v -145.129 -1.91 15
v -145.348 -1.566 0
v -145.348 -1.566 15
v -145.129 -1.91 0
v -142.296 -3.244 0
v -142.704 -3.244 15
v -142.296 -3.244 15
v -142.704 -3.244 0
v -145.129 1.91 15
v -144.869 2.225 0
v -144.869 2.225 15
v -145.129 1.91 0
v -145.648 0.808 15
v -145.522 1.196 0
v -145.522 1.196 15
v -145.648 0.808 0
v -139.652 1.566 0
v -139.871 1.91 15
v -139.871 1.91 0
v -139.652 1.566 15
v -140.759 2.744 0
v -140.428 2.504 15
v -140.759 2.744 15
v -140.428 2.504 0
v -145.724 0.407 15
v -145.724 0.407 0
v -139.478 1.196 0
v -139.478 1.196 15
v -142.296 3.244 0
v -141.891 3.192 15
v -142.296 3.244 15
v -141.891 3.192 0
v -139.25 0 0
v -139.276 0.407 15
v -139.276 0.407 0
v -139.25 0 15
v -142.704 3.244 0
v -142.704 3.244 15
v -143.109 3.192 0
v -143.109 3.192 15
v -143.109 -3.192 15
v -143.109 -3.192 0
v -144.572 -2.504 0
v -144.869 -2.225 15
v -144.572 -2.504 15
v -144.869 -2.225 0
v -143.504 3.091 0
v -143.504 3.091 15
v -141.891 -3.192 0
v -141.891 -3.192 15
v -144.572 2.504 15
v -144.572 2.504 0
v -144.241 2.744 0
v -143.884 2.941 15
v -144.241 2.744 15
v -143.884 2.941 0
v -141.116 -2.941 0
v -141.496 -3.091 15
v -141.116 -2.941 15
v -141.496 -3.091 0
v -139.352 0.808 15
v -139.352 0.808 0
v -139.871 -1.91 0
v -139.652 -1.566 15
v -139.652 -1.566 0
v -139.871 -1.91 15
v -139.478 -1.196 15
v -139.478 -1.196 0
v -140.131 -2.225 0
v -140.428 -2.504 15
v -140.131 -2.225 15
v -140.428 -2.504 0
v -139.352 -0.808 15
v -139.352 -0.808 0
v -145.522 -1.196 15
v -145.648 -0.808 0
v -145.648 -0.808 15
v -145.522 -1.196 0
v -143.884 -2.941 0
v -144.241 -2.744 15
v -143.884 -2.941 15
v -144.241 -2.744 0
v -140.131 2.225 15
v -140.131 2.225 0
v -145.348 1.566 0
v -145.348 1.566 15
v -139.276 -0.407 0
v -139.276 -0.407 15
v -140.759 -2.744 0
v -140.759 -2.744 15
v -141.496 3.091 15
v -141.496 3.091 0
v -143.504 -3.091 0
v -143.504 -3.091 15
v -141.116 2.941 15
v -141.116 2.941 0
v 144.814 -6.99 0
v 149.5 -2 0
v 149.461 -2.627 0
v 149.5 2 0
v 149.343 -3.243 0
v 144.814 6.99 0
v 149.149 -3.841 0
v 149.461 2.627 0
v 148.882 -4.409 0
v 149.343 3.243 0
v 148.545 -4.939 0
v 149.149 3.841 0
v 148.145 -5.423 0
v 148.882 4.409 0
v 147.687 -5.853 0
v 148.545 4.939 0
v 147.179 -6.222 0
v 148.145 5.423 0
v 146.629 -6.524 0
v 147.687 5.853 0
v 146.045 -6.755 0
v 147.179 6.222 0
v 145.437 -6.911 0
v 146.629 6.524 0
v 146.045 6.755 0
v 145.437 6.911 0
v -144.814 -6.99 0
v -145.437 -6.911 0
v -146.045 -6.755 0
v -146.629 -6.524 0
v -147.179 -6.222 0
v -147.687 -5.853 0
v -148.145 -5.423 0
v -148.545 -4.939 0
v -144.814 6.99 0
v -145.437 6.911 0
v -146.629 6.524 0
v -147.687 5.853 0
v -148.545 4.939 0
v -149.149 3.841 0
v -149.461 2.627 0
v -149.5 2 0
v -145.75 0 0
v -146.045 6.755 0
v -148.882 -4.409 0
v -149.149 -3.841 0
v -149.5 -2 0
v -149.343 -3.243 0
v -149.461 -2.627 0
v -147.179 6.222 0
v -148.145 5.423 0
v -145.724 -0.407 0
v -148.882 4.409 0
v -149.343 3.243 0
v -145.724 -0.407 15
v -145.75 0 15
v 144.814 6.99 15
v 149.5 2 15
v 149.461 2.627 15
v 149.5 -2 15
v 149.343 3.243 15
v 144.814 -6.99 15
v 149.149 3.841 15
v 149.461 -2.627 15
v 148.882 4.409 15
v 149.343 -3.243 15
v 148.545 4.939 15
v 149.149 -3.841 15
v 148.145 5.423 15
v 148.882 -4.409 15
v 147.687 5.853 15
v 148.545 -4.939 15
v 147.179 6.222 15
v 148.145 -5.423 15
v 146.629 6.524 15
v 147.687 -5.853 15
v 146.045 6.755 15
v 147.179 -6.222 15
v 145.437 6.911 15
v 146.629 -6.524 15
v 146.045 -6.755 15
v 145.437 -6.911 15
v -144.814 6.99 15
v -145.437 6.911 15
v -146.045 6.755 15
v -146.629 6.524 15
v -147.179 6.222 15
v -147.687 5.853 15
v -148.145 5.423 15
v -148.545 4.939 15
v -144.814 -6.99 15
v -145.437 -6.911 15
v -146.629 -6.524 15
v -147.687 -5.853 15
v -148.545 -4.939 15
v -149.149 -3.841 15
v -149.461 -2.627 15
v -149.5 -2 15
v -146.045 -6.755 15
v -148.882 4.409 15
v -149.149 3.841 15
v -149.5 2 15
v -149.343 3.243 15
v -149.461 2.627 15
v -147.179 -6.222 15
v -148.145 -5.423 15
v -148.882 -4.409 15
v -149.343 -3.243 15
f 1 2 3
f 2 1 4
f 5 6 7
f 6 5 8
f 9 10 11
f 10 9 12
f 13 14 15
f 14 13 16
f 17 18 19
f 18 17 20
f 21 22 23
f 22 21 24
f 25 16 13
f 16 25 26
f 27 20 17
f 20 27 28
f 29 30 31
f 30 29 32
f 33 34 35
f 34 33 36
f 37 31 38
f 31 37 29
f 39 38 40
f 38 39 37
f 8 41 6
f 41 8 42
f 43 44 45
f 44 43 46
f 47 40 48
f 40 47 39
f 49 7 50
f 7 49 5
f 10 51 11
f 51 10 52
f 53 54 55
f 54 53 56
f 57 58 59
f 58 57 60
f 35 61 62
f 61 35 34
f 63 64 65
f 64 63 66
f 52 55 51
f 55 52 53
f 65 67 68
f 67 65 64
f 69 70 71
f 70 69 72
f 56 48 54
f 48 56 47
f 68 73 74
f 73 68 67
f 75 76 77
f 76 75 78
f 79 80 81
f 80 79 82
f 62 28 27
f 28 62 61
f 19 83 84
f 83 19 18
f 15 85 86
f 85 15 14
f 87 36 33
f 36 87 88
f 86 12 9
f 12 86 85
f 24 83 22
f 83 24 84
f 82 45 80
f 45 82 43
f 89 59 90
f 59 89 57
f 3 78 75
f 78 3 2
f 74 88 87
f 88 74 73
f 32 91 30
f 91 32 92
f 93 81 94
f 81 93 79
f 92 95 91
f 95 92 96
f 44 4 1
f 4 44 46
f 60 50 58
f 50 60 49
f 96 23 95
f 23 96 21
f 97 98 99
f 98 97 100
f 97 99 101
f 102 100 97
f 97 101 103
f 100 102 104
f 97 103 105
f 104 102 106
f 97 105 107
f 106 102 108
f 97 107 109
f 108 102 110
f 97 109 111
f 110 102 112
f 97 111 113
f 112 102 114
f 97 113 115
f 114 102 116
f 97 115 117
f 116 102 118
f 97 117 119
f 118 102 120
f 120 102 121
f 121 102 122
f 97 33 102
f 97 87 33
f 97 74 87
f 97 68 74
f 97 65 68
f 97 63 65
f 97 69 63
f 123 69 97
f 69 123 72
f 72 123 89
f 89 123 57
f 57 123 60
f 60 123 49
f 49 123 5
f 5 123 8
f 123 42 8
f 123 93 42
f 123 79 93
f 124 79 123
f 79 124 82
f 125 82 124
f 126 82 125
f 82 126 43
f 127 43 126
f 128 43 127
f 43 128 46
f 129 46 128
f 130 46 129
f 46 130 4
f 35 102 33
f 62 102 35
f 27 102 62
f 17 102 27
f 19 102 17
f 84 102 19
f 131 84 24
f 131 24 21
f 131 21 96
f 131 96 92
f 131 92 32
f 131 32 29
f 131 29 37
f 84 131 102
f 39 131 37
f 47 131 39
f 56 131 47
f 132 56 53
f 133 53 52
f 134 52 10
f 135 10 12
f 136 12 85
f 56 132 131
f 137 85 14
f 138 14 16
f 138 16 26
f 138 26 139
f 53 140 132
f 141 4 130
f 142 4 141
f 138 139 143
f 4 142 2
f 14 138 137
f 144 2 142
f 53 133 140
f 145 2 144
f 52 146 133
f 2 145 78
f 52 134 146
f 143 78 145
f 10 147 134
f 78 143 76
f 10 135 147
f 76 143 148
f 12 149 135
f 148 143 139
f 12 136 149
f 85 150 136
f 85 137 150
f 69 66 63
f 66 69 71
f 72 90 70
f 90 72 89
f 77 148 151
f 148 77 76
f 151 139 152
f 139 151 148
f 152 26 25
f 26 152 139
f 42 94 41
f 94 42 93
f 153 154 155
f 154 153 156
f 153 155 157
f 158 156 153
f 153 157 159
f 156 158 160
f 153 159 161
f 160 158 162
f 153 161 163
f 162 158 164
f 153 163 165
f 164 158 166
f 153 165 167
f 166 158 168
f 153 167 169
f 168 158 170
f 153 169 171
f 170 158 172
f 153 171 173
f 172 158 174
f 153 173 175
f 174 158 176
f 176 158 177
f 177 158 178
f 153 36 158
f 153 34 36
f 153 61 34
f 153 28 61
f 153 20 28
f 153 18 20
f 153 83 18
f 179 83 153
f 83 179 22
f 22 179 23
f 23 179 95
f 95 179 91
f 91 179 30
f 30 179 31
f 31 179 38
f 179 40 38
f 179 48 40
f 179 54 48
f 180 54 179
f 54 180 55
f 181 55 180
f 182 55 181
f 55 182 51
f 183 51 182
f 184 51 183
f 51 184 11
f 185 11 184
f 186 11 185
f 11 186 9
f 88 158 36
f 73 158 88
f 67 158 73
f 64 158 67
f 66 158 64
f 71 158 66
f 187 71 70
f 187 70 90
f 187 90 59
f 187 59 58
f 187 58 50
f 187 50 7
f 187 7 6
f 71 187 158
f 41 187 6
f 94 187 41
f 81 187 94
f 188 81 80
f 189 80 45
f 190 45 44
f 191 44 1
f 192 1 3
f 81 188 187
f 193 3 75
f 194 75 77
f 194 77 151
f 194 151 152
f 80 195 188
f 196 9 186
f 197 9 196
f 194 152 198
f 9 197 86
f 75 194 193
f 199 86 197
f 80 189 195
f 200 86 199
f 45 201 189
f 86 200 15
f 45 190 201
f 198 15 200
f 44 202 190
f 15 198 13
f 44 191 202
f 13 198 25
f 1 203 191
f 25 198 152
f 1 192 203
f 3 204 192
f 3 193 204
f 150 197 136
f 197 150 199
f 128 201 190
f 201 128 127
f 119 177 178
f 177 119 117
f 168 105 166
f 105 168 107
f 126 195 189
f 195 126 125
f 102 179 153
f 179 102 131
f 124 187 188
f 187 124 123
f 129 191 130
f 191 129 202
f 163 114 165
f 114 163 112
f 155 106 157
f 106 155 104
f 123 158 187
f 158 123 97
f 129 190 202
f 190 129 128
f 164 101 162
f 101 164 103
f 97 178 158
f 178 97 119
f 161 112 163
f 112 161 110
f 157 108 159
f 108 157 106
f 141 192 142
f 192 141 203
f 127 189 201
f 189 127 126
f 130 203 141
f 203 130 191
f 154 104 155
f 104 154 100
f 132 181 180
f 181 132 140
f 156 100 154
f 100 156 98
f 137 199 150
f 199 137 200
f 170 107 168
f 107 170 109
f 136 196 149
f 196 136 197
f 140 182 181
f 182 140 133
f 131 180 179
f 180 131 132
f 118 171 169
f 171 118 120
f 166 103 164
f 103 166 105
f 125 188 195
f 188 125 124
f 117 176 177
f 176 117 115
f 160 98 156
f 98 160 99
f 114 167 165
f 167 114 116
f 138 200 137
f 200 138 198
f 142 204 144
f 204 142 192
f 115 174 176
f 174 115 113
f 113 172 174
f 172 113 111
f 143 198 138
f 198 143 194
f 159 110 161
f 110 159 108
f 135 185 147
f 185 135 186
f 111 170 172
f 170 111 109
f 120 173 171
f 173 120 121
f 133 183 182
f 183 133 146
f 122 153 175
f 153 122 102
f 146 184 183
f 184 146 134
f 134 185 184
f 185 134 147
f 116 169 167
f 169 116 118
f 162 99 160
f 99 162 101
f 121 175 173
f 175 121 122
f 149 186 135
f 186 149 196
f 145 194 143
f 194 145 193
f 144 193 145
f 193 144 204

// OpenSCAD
$fn = 50;


difference() {
	union() {
		hull() {
			translate(v = [-144.5000000000, 2.0000000000, 0]) {
				cylinder(h = 15, r = 5);
			}
			translate(v = [144.5000000000, 2.0000000000, 0]) {
				cylinder(h = 15, r = 5);
			}
			translate(v = [-144.5000000000, -2.0000000000, 0]) {
				cylinder(h = 15, r = 5);
			}
			translate(v = [144.5000000000, -2.0000000000, 0]) {
				cylinder(h = 15, r = 5);
			}
		}
	}
	union() {
		translate(v = [-142.5000000000, 0.0000000000, 0]) {
			cylinder(h = 15, r = 3.2500000000);
		}
		translate(v = [-142.5000000000, 0.0000000000, 0]) {
			cylinder(h = 15, r = 1.8000000000);
		}
		translate(v = [-142.5000000000, 0.0000000000, 0]) {
			cylinder(h = 15, r = 1.8000000000);
		}
		translate(v = [-142.5000000000, 0.0000000000, 0]) {
			cylinder(h = 15, r = 1.8000000000);
		}
	}
}
